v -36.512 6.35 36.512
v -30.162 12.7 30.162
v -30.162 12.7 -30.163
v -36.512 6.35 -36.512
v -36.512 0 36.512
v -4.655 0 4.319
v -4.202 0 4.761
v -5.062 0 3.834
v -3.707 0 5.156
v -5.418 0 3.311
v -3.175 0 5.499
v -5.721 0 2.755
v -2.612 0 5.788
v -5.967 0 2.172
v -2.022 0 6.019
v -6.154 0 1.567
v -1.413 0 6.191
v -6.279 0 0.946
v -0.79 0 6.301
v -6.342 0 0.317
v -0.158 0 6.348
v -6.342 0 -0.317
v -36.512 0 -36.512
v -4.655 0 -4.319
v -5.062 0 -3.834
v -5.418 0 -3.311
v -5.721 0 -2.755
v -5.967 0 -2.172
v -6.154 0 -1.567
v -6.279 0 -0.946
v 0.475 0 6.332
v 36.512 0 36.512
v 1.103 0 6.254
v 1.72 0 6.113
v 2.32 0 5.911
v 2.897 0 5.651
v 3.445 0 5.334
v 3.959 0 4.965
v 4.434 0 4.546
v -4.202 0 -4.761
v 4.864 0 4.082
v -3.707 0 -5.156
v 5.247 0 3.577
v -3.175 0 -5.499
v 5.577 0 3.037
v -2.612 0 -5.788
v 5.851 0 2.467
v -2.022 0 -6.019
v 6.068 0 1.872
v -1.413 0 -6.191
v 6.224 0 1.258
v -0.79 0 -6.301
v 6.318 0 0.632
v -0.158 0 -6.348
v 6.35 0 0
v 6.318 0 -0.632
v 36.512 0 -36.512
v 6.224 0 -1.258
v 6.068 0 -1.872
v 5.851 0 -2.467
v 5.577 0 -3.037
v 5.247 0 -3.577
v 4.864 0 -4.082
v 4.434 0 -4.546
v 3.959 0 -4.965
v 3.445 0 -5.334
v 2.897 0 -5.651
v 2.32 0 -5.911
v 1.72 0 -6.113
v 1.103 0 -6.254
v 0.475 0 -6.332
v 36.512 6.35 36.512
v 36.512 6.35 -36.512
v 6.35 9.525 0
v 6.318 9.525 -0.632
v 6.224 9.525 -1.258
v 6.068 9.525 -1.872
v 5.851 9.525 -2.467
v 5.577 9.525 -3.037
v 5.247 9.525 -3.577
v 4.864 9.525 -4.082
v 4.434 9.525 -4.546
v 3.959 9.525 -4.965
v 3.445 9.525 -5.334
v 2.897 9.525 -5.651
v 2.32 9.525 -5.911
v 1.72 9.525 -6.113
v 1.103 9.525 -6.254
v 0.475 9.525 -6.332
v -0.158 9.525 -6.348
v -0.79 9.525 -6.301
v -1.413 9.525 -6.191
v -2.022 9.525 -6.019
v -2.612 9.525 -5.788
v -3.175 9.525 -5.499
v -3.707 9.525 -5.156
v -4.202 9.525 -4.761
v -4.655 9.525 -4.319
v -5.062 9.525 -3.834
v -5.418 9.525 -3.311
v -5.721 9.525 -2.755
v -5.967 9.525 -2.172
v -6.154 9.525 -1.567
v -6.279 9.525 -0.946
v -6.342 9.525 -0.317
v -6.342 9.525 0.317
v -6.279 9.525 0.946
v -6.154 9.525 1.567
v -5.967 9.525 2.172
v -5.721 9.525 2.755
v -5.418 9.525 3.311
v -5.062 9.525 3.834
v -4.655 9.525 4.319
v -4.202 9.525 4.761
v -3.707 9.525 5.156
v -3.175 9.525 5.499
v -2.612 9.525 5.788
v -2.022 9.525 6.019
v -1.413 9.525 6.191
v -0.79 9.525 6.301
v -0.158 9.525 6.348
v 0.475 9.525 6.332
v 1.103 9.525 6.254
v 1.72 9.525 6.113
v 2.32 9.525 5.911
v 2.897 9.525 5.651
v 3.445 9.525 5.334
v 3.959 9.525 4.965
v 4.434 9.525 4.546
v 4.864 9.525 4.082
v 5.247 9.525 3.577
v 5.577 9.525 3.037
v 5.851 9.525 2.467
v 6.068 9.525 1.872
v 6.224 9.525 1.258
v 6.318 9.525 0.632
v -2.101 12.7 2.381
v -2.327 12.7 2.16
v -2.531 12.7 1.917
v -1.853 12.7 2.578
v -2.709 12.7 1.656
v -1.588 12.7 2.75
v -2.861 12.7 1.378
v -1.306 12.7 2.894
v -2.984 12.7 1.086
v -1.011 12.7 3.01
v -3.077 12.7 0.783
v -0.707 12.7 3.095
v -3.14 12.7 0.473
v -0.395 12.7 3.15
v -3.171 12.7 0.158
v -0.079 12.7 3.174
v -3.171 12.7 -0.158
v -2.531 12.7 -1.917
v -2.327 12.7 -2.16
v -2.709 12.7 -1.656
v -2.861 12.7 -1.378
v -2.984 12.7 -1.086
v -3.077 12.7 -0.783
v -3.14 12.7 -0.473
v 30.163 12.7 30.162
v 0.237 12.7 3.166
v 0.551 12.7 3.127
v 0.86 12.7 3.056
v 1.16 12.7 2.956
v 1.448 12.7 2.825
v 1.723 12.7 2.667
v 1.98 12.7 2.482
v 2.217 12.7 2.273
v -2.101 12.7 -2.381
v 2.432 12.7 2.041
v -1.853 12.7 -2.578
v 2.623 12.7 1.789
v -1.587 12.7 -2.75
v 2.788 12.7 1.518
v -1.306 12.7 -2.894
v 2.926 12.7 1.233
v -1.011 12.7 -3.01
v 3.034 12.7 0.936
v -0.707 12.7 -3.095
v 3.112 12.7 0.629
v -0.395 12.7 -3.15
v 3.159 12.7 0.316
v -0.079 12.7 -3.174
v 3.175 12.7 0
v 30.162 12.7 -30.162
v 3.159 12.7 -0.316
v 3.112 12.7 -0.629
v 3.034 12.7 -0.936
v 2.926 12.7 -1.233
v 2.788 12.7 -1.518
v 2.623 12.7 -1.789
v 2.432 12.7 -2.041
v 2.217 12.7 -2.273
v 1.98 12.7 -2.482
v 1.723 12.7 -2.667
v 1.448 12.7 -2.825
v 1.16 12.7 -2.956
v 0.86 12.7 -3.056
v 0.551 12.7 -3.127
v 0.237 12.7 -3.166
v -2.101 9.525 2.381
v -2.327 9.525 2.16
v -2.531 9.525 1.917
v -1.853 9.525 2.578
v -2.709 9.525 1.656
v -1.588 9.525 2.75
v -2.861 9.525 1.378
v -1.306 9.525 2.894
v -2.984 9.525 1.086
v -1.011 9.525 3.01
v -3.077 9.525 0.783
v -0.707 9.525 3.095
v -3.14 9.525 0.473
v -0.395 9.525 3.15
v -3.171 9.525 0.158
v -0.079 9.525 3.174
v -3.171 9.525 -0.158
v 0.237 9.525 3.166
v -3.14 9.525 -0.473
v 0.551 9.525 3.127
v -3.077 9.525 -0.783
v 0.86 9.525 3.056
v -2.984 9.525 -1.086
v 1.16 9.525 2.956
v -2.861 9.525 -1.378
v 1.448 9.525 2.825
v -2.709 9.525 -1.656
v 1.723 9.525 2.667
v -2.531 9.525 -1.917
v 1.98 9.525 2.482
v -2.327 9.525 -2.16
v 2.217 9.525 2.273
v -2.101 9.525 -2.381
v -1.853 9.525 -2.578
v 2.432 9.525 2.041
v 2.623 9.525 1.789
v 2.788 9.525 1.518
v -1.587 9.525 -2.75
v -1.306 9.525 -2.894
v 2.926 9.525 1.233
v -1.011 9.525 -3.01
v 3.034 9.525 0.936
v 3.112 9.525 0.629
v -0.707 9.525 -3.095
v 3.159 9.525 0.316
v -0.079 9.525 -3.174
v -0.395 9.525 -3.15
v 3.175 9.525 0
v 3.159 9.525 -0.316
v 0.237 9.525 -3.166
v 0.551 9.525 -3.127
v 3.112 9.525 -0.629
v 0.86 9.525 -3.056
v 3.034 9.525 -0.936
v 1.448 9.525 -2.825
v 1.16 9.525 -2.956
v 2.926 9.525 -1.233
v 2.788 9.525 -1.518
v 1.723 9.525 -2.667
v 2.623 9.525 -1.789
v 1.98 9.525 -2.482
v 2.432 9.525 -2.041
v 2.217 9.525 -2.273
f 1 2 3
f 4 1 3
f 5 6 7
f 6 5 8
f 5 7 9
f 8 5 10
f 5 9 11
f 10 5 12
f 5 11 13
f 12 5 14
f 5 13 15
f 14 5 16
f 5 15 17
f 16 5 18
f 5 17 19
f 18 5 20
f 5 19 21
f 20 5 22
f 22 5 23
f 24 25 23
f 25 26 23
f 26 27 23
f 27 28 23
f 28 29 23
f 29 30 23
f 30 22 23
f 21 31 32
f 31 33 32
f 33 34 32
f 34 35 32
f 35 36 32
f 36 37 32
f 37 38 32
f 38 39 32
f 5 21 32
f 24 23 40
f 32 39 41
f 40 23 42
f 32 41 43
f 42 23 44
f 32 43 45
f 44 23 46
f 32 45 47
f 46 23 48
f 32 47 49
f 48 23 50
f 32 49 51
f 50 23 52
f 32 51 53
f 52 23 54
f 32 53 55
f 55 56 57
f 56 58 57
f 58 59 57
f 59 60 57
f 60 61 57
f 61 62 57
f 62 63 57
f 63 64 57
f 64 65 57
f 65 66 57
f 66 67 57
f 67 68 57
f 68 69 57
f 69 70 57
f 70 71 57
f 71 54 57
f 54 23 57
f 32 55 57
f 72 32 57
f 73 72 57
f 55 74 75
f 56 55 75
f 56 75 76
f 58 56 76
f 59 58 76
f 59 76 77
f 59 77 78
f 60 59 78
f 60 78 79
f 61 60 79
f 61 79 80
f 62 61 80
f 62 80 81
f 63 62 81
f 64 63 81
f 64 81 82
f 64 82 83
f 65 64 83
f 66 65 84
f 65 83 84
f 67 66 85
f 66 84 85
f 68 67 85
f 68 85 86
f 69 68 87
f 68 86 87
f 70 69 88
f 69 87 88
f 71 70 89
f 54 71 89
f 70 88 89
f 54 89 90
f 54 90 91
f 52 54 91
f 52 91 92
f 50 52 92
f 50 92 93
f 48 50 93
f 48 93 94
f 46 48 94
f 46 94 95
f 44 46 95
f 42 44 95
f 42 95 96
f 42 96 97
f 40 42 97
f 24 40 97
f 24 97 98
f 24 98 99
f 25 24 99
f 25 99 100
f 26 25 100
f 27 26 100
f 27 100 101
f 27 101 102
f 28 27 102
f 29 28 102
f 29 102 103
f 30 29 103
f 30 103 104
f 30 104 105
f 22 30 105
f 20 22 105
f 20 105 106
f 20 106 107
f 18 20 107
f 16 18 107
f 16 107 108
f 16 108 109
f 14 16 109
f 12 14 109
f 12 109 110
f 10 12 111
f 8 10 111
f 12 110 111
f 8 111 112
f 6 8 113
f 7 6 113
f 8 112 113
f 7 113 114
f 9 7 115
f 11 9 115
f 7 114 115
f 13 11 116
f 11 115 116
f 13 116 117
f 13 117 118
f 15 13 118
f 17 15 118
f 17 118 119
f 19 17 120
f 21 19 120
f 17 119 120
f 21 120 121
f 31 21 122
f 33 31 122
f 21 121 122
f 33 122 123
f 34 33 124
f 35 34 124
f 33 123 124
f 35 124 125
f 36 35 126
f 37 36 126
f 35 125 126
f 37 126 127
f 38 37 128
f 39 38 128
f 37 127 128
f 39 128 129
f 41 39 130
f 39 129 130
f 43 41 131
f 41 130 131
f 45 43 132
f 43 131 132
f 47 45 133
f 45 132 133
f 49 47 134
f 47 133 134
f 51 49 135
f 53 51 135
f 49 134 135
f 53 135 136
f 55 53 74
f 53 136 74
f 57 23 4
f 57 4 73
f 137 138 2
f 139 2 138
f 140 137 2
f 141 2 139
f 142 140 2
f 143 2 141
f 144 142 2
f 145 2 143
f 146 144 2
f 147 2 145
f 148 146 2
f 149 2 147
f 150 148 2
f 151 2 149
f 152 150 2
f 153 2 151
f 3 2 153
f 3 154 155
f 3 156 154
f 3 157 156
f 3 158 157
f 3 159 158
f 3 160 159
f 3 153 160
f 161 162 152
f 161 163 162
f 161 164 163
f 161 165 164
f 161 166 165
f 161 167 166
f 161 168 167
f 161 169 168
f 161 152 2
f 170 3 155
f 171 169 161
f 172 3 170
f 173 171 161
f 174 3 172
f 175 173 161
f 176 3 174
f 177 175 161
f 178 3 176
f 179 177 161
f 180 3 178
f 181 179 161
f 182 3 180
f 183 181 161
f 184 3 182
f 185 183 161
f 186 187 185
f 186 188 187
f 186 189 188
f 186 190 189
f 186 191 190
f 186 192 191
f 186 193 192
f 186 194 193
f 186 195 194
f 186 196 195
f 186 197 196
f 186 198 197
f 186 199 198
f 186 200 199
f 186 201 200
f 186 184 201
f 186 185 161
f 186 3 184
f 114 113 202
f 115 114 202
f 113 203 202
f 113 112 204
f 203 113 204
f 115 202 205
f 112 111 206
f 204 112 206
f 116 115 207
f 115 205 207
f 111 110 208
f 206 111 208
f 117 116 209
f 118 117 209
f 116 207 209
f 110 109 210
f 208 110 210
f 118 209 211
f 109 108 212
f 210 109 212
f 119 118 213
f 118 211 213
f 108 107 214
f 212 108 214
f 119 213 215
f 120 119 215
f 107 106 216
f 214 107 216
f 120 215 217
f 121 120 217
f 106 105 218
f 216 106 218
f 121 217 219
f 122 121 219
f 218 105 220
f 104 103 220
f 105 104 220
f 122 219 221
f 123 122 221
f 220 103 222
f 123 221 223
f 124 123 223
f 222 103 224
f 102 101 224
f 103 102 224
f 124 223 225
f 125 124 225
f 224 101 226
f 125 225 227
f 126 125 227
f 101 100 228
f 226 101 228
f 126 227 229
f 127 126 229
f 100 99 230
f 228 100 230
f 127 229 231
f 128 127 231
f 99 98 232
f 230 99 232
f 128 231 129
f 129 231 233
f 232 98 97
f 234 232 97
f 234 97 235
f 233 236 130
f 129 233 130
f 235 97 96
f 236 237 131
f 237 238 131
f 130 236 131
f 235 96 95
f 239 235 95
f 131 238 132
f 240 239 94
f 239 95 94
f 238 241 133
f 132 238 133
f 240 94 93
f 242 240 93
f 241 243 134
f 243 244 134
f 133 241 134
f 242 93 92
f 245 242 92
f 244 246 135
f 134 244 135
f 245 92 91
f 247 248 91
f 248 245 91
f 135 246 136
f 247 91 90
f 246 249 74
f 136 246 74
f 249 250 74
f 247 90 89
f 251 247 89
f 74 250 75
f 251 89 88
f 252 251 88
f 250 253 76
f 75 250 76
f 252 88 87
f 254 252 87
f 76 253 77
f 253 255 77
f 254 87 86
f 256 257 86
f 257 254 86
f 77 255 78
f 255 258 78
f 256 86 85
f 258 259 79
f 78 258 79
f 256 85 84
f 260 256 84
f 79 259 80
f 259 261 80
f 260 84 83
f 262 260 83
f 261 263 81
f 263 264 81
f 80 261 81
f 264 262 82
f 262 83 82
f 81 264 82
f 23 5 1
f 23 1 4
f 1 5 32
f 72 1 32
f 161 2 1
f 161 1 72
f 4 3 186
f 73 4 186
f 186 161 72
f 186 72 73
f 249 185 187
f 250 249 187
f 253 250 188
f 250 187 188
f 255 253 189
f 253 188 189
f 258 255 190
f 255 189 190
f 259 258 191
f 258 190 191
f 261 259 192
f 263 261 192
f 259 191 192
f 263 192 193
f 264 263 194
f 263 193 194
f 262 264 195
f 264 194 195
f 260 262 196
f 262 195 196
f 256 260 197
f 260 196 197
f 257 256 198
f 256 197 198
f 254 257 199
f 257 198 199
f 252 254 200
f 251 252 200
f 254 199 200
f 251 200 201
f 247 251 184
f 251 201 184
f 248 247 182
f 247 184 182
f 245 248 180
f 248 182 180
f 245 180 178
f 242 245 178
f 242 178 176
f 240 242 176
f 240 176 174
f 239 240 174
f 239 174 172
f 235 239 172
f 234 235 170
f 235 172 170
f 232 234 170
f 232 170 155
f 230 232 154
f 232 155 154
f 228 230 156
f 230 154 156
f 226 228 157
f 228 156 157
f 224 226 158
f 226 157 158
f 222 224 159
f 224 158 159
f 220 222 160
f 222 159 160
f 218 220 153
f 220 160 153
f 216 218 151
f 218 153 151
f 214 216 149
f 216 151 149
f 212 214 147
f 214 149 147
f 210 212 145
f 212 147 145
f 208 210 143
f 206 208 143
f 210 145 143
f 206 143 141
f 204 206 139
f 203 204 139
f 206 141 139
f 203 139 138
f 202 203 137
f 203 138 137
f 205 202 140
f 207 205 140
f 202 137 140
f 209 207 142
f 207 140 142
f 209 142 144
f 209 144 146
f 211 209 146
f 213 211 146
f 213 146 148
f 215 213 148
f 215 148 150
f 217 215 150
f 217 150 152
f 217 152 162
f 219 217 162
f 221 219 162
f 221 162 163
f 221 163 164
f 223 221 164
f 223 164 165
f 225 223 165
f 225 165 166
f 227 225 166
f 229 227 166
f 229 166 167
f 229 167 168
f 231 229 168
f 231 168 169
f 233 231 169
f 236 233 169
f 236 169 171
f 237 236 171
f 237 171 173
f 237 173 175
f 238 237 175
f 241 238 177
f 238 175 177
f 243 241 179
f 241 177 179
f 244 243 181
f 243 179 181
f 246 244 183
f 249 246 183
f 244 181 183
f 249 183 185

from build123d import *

# Parameters (mm, degrees)
SKETCH1_W           = 73.025
SKETCH1_H           = 73.025
BOSS_EXTRUDE1_DEPTH = 12.7
CHAMFER1_SIZE       = 6.35
SKETCH4_R           = 3.175
CUT_EXTRUDE1_DEPTH  = 3.175
CUT_EXTRUDE2_REACH  = 11.525
SKETCH5_R           = 6.35


with BuildPart() as part:
    # Sketch1 → Boss-Extrude1 (new body)
    with BuildSketch(Plane(origin=(0, 0, 0), x_dir=(1, 0, 0), z_dir=(0, 1, 0))):
        Rectangle(SKETCH1_W, SKETCH1_H)
    extrude(amount=BOSS_EXTRUDE1_DEPTH)

    # Chamfer1
    chamfer1_edges = [part.edges().sort_by_distance(p)[0] for p in [
        (-36.5125, 12.7, 0),
        (0, 12.7, 36.5125),
        (36.5125, 12.7, 0),
        (0, 12.7, -36.5125),
    ]]
    chamfer(chamfer1_edges, length=CHAMFER1_SIZE)

    # Sketch4 → Cut-Extrude1 (cut)
    with BuildSketch(Plane(origin=(0, 12.7, 0), x_dir=(1, 0, 0), z_dir=(0, 1, 0))):
        Circle(SKETCH4_R)
    extrude(amount=-CUT_EXTRUDE1_DEPTH, mode=Mode.SUBTRACT)

    # Sketch5 → Cut-Extrude2 (cut, up to next)
    with BuildSketch(Plane(origin=(0, 9.525, 0), x_dir=(1, 0, 0), z_dir=(0, 1, 0)), mode=Mode.PRIVATE) as cut_extrude2_sk1:
        Circle(SKETCH5_R)
    cut_extrude2_tool1 = extrude(cut_extrude2_sk1.sketch, amount=-CUT_EXTRUDE2_REACH, mode=Mode.PRIVATE) & part.part
    add(cut_extrude2_tool1.solids().sort_by_distance((0, 9.525, 0))[0], mode=Mode.SUBTRACT)


solid = part.part
